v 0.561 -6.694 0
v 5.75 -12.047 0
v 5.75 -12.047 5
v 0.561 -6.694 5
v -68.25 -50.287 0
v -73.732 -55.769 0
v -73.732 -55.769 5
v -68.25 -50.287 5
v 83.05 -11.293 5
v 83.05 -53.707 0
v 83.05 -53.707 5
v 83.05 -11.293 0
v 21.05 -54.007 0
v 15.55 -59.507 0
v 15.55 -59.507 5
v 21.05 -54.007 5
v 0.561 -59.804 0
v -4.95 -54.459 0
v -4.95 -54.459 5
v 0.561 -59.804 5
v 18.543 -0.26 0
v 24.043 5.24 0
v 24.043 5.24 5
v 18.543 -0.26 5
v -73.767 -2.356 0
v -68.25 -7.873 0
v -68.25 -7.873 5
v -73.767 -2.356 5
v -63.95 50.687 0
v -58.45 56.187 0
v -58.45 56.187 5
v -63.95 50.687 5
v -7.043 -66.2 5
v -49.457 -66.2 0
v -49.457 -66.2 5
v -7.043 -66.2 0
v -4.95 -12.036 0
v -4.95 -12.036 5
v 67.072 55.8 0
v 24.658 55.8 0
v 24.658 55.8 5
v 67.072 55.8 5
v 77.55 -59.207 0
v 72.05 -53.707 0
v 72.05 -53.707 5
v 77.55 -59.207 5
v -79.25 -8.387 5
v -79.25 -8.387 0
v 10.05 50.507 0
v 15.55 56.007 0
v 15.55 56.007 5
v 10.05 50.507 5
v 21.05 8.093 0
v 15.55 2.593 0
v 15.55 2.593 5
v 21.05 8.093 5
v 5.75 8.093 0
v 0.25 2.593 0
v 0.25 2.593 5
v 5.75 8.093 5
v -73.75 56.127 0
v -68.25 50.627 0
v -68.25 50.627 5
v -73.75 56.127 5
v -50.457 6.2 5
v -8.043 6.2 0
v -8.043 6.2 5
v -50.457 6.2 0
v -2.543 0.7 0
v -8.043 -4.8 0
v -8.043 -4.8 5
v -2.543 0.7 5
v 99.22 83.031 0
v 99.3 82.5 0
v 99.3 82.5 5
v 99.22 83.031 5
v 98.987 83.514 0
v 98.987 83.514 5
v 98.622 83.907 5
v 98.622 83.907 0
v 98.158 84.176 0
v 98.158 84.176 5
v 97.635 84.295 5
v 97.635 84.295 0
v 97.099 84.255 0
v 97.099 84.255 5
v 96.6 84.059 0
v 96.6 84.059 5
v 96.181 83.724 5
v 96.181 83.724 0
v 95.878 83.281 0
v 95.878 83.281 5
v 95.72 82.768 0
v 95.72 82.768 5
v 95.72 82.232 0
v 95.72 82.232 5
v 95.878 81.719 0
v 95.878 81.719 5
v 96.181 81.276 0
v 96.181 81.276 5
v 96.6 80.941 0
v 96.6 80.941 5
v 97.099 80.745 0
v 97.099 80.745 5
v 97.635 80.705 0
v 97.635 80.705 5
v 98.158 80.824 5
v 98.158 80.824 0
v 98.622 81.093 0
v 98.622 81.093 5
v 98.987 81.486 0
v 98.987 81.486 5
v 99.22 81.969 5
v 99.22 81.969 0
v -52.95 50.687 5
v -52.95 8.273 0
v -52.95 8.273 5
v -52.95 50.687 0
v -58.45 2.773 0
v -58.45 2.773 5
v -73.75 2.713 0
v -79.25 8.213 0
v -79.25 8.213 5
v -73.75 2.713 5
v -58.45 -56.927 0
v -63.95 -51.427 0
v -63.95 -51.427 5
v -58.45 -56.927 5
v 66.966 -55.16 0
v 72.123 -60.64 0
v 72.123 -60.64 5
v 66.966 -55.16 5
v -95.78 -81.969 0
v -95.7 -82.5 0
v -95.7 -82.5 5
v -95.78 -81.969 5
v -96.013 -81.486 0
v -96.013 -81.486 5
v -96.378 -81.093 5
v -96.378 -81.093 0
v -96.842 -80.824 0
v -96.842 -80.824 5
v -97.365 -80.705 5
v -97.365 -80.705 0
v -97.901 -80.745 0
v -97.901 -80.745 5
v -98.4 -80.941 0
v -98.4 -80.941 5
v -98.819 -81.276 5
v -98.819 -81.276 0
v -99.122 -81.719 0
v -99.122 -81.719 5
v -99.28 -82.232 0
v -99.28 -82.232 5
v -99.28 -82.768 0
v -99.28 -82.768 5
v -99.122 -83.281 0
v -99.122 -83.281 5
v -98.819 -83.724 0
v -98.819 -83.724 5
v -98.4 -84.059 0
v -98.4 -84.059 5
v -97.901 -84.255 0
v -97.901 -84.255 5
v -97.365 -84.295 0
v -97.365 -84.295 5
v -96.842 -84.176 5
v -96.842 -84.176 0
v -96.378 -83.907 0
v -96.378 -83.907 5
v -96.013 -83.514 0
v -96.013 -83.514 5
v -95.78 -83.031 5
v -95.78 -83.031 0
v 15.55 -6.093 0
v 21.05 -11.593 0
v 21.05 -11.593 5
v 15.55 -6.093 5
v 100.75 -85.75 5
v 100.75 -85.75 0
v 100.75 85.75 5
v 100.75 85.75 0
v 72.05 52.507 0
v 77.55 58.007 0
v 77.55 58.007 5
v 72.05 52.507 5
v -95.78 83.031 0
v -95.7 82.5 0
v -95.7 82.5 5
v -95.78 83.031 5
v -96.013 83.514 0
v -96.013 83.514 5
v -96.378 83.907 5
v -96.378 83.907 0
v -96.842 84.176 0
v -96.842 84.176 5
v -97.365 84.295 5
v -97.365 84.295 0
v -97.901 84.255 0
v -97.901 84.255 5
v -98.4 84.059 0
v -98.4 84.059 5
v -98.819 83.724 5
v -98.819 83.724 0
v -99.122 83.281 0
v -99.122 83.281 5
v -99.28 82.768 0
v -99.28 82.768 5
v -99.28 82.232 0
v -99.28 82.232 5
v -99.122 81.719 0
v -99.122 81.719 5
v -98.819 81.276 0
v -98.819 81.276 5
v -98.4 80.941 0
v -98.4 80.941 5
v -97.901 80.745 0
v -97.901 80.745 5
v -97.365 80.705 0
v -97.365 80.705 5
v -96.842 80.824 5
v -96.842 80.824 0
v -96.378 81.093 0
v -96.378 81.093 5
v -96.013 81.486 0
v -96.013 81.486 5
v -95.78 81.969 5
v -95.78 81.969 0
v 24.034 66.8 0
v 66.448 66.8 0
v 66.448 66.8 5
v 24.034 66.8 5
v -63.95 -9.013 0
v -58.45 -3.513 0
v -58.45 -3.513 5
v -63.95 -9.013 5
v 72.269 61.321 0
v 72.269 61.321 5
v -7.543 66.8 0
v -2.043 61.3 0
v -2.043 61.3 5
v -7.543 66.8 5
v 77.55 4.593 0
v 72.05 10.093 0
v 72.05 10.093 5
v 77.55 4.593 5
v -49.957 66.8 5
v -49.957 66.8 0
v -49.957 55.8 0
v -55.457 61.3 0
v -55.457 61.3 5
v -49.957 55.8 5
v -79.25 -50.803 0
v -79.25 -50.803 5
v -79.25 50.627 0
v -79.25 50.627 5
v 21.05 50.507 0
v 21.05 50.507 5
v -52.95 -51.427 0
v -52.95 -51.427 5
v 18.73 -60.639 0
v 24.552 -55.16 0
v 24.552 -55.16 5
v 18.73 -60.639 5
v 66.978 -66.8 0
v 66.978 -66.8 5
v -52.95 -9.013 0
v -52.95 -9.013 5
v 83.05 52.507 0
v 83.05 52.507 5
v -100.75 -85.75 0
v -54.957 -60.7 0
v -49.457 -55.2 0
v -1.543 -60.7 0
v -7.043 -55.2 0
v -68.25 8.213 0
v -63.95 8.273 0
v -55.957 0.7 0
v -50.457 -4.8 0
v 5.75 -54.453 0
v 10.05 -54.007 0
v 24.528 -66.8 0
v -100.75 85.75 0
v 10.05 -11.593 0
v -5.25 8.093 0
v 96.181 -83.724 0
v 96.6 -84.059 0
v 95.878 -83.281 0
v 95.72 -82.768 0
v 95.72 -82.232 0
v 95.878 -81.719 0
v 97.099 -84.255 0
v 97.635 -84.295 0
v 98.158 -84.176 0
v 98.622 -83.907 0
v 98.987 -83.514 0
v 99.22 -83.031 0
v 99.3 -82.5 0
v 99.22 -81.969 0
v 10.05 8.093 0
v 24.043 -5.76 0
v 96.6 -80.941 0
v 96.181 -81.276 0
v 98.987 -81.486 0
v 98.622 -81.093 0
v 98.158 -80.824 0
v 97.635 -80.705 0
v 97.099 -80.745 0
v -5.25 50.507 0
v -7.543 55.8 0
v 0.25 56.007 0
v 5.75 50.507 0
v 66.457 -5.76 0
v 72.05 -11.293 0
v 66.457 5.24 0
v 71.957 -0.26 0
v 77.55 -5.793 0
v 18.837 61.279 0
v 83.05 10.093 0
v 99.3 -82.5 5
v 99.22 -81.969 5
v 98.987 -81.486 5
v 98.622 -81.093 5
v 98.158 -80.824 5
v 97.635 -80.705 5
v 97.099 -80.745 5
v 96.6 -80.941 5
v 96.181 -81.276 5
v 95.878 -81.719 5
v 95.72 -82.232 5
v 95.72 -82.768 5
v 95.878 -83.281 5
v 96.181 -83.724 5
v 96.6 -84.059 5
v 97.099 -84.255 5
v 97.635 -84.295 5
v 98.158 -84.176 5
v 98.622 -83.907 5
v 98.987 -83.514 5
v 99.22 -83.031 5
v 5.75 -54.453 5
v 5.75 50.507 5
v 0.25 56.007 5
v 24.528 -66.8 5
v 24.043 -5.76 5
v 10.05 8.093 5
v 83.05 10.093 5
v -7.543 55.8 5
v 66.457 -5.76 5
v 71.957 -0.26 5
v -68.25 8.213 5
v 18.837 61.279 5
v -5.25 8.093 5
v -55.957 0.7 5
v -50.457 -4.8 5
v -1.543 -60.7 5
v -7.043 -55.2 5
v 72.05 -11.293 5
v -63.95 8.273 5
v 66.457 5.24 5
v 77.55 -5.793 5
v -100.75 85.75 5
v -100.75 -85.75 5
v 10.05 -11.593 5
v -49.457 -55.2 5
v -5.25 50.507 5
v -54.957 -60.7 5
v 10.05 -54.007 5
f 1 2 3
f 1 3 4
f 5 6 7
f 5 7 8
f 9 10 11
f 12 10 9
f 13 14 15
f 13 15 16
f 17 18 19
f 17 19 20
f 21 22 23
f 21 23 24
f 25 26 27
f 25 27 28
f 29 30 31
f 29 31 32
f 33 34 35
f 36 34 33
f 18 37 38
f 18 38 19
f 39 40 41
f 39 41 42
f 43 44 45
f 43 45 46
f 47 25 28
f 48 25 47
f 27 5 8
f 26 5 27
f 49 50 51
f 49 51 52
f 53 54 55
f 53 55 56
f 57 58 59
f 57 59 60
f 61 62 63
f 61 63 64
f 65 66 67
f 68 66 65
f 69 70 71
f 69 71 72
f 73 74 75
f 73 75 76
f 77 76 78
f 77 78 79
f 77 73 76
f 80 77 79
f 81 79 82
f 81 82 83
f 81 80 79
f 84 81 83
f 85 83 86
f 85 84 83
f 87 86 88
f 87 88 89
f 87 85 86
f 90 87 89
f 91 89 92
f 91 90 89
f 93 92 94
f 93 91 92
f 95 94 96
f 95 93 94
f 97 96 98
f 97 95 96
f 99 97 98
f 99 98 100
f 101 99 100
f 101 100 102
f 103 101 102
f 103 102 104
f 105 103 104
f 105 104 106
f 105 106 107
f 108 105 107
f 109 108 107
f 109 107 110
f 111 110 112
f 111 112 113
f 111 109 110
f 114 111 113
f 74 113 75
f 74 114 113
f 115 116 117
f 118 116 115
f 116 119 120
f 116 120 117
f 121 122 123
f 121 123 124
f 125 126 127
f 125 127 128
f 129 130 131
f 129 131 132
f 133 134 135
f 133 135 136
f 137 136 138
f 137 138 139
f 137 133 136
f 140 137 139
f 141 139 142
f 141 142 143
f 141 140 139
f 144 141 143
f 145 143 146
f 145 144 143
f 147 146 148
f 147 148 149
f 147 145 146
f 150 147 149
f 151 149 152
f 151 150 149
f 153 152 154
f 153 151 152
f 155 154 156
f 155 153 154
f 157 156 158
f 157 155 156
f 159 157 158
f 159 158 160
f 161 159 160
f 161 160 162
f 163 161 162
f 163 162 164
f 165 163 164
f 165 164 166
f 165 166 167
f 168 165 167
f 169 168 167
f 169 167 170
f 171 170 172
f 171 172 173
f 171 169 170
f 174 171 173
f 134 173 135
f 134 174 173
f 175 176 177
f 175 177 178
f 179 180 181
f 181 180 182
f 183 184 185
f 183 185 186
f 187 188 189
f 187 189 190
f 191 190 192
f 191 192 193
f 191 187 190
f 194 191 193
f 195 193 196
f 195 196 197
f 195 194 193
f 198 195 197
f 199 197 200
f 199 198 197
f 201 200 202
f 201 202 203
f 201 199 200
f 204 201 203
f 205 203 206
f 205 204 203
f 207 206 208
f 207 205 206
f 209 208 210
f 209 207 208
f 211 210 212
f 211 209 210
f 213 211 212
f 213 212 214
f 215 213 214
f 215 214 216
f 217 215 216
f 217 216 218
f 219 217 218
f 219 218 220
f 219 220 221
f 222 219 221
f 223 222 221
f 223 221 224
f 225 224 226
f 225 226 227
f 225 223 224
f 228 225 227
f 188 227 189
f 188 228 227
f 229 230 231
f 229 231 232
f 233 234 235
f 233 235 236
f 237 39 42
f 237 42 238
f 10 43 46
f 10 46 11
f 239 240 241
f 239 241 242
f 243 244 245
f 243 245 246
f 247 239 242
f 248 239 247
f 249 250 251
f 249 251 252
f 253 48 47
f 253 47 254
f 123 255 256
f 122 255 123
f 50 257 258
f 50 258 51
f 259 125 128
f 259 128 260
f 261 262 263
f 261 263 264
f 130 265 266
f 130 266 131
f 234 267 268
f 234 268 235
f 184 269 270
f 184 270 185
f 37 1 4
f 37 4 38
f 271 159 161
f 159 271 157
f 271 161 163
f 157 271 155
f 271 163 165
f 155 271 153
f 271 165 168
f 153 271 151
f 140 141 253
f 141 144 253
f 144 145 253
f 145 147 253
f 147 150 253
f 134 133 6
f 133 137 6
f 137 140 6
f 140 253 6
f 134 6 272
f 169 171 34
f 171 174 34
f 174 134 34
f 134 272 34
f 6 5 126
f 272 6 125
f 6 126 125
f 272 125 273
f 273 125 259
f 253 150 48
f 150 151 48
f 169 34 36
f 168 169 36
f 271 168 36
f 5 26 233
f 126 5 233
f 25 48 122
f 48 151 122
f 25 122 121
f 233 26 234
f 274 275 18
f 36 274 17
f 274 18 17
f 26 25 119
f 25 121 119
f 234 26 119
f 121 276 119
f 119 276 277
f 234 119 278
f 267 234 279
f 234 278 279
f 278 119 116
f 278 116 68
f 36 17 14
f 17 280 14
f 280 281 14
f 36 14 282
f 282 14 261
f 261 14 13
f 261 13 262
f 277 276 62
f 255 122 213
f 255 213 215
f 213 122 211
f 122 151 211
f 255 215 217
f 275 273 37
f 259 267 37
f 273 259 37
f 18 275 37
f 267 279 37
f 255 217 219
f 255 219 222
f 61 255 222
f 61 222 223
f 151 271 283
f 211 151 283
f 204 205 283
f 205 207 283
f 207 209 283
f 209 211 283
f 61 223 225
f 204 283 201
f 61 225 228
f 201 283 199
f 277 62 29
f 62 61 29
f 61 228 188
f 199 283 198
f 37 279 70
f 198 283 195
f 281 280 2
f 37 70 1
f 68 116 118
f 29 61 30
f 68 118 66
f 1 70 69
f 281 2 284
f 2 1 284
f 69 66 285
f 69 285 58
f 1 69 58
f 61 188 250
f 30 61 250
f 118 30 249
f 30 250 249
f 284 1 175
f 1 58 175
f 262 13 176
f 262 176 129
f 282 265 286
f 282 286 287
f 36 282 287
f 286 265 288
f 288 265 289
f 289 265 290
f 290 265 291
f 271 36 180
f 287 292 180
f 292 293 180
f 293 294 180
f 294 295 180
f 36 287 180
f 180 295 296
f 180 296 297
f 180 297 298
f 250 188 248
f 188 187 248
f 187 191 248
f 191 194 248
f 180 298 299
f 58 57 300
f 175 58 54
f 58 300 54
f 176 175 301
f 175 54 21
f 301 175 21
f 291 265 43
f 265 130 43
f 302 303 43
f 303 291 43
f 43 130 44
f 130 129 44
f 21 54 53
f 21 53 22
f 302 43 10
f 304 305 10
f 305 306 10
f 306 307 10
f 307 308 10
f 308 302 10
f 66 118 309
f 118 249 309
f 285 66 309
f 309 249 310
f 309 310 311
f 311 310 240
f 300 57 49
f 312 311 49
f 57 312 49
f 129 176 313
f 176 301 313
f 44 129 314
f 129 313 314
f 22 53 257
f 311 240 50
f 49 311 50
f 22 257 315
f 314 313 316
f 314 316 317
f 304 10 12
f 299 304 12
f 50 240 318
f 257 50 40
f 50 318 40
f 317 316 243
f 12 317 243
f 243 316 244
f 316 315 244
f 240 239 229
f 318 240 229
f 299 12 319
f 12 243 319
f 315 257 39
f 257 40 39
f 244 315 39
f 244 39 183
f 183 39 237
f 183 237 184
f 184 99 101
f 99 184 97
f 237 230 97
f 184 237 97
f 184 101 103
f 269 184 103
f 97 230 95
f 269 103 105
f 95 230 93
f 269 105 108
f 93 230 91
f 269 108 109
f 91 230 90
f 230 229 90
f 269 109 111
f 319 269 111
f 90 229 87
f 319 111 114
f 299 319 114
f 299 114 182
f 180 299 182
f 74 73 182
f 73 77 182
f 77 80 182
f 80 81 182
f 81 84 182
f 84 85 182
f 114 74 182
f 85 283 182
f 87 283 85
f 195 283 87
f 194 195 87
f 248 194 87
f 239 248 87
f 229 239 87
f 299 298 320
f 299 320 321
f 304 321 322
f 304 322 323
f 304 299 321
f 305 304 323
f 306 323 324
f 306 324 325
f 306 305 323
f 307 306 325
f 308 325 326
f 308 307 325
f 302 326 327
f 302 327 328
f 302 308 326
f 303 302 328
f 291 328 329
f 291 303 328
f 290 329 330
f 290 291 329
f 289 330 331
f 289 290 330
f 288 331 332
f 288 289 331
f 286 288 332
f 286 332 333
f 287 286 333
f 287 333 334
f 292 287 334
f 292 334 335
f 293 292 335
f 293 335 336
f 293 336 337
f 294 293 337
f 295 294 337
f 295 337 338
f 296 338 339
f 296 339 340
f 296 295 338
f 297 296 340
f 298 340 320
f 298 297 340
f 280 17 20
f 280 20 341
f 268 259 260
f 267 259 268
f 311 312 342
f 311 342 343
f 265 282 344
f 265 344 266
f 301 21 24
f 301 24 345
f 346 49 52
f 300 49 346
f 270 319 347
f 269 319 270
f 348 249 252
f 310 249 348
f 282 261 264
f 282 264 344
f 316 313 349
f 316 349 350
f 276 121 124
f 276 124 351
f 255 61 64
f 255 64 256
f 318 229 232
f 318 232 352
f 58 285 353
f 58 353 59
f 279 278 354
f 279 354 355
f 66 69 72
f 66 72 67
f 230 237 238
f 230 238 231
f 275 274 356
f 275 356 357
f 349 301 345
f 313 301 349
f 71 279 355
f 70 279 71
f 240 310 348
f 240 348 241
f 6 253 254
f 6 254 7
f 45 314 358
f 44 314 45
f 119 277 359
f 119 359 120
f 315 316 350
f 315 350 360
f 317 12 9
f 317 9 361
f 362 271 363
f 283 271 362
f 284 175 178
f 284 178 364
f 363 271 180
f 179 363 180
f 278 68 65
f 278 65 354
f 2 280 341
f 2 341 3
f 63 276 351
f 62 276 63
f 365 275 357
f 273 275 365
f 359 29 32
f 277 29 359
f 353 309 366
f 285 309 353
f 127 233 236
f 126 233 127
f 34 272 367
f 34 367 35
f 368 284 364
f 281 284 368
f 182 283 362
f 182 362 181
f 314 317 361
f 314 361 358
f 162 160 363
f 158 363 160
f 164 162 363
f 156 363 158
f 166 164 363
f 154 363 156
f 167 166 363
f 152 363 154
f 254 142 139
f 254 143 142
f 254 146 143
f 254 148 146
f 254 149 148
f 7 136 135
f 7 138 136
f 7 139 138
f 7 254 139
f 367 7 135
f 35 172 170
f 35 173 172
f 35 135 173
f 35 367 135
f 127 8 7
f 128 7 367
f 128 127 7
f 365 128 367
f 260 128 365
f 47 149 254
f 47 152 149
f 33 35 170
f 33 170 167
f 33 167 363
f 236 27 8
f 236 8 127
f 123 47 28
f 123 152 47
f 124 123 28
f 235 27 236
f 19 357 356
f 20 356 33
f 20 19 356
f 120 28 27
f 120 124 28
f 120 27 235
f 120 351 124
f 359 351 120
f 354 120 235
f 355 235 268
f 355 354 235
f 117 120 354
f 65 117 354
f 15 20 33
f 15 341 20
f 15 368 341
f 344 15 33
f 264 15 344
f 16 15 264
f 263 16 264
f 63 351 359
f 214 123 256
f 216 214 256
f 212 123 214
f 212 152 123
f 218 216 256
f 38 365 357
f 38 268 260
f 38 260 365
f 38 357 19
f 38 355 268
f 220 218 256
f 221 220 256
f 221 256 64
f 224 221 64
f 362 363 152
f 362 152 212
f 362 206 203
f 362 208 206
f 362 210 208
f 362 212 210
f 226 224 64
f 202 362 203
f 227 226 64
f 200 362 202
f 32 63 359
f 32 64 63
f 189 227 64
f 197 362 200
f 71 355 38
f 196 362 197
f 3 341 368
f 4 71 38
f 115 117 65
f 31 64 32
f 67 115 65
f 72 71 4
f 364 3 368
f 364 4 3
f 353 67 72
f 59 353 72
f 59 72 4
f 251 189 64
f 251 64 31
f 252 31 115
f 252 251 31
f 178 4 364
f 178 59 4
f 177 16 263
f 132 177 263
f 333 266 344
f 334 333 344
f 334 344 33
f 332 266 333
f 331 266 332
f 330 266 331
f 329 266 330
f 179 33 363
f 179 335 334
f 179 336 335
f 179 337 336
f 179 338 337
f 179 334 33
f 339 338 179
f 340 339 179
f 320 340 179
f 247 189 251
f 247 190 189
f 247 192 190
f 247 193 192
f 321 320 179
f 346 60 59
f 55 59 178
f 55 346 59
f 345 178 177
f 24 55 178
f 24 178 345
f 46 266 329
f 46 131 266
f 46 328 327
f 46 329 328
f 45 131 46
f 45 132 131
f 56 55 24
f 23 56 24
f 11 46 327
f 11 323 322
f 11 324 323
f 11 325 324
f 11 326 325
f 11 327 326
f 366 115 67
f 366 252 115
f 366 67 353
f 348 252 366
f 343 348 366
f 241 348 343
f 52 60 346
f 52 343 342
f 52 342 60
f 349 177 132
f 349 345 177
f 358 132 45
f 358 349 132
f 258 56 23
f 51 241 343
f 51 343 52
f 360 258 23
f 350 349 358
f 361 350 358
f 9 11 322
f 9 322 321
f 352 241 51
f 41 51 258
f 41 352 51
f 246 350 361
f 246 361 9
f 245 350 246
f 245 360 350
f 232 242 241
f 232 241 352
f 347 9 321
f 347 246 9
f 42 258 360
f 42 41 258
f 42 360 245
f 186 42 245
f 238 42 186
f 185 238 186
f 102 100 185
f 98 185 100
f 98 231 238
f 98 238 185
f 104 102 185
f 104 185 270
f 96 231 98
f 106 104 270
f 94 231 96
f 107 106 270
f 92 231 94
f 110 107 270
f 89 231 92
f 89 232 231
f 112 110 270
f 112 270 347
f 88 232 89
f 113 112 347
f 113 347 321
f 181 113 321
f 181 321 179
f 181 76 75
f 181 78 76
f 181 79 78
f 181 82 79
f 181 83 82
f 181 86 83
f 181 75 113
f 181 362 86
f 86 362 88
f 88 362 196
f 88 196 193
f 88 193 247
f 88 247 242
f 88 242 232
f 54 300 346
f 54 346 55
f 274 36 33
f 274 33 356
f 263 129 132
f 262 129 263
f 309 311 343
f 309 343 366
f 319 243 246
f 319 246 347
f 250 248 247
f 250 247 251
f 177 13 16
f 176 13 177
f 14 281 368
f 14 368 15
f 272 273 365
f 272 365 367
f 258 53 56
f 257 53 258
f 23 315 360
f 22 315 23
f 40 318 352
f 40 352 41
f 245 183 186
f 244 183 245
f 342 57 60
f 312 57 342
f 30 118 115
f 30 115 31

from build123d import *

# Parameters (mm, degrees)
SKETCH1_W          = 201.5
SKETCH1_H          = 171.5
MAIN_BODY_DEPTH    = 5
CUT_START          = -5
CUT_AREA_OUTLINE_R = 1.8
CUT_AREA_DEPTH     = 5


# Read off the part's stored shape, not the designer's step: Cut Area
with BuildPart() as part:
    # Sketch1 → Main Body (new body)
    with BuildSketch(Plane.XY):
        Rectangle(SKETCH1_W, SKETCH1_H)
    extrude(amount=MAIN_BODY_DEPTH)

    # Cut Area outline → Cut Area (cut)
    with BuildSketch(Plane.XY.offset(5).offset(CUT_START)):
        Polygon((-68.25, 50.627106781), (-73.75, 56.127106781), (-79.25, 50.627106781), (-79.25, 8.212893219), (-73.75, 2.712893219), (-68.25, 8.212893219), align=None)
        Polygon((-73.731881274, -55.768988055), (-68.25, -50.287106781), (-68.25, -7.872893219), (-73.767236503, -2.355656716), (-79.25, -8.386696563), (-79.25, -50.802681202), align=None)
        with Locations((97.5, 82.5)):
            Circle(CUT_AREA_OUTLINE_R)
        with Locations((-97.5, -82.5)):
            Circle(CUT_AREA_OUTLINE_R)
        with Locations((97.5, -82.5)):
            Circle(CUT_AREA_OUTLINE_R)
        Polygon((-8.042893219, 6.2), (-50.457106781, 6.2), (-55.957106781, 0.7), (-50.457106781, -4.8), (-8.042893219, -4.8), (-2.542893219, 0.7), align=None)
        Polygon((-49.457106781, -55.2), (-54.957106781, -60.7), (-49.457106781, -66.2), (-7.042893219, -66.2), (-1.542893219, -60.7), (-7.042893219, -55.2), align=None)
        Polygon((5.75, 50.507106781), (0.25, 56.007106781), (-5.25, 50.507106781), (-5.25, 8.092893219), (0.25, 2.592893219), (5.75, 8.092893219), align=None)
        Polygon((0.560856139, -59.803608472), (5.75, -54.452624011), (5.75, -12.047441696), (0.561015758, -6.694204099), (-4.95, -12.036125396), (-4.95, -54.459428254), align=None)
        Polygon((66.448293895, 66.8), (24.033969108, 66.8), (18.837162213, 61.278595298), (24.657956105, 55.8), (67.072280892, 55.8), (72.269087787, 61.321404702), align=None)
        Polygon((-2.042893219, 61.3), (-7.542893219, 66.8), (-49.957106781, 66.8), (-55.457106781, 61.3), (-49.957106781, 55.8), (-7.542893219, 55.8), align=None)
        Polygon((-52.95, 8.272893219), (-52.95, 50.687106781), (-58.45, 56.187106781), (-63.95, 50.687106781), (-63.95, 8.272893219), (-58.45, 2.772893219), align=None)
        Polygon((-58.45, -56.927106781), (-52.95, -51.427106781), (-52.95, -9.012893219), (-58.45, -3.512893219), (-63.95, -9.012893219), (-63.95, -51.427106781), align=None)
        Polygon((24.042893219, 5.24), (18.542893219, -0.26), (24.042893219, -5.76), (66.457106781, -5.76), (71.957106781, -0.26), (66.457106781, 5.24), align=None)
        Polygon((83.05, 52.507106781), (77.55, 58.007106781), (72.05, 52.507106781), (72.05, 10.092893219), (77.55, 4.592893219), (83.05, 10.092893219), align=None)
        Polygon((77.55, -59.207106781), (83.05, -53.707106781), (83.05, -11.292893219), (77.55, -5.792893219), (72.05, -11.292893219), (72.05, -53.707106781), align=None)
        with Locations((-97.5, 82.5)):
            Circle(CUT_AREA_OUTLINE_R)
        Polygon((21.05, 50.507106781), (15.55, 56.007106781), (10.05, 50.507106781), (10.05, 8.092893219), (15.55, 2.592893219), (21.05, 8.092893219), align=None)
        Polygon((15.55, -59.507106781), (21.05, -54.007106781), (21.05, -11.592893219), (15.55, -6.092893219), (10.05, -11.592893219), (10.05, -54.007106781), align=None)
        Polygon((24.551704565, -55.16), (18.730025795, -60.638537988), (24.528319558, -66.8), (66.978214993, -66.8), (72.123248282, -60.640233696), (66.966029948, -55.16), align=None)
    extrude(amount=CUT_AREA_DEPTH, mode=Mode.SUBTRACT)


solid = part.part
